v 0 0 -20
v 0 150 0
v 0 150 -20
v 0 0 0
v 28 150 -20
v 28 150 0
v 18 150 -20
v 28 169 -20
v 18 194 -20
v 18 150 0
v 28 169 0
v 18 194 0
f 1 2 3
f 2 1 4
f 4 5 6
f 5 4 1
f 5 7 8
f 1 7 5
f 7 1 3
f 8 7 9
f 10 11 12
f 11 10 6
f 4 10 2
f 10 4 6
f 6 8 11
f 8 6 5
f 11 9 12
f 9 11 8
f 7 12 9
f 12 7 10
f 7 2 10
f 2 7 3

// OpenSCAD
/*
 *
 * 3D-printable parametric model for a ramp to step roller blinds over skirting and windowsill
 *
 */
module prism(l, w, h) {
       polyhedron(
               points=[[0,0,0], [l,0,0], [l,w,0], [0,w,0], [0,w,h], [l,w,h]],
               faces=[[0,1,2,3],[5,4,3,2],[0,4,5,1],[0,3,4],[5,2,1]]
               );
}
height = 150;
width = 20;
skirtproj = 18;
sillproj = 10;
sillthick = 19;
belowsill = 25;
rotate( [0,90,0] )
difference () {
    union() {
        translate( [0,0,0] ) prism( width,height,skirtproj+sillproj );
        translate( [0,height,0] ) cube( [width,sillthick,skirtproj+sillproj] );
        translate( [0,height+sillthick,0] ) cube( [width,belowsill,skirtproj] );
        rotate( 180 ) translate( [-width,-height-sillthick-belowsill,skirtproj] ) prism( width,belowsill,sillproj );
    }
    union() {
        translate( [-5,height,-5] ) cube( [width+10,sillthick,skirtproj+5] );
        translate( [-5,height,-5] ) cube( [width+10,sillthick+belowsill+5,skirtproj+5] );
    }
}
